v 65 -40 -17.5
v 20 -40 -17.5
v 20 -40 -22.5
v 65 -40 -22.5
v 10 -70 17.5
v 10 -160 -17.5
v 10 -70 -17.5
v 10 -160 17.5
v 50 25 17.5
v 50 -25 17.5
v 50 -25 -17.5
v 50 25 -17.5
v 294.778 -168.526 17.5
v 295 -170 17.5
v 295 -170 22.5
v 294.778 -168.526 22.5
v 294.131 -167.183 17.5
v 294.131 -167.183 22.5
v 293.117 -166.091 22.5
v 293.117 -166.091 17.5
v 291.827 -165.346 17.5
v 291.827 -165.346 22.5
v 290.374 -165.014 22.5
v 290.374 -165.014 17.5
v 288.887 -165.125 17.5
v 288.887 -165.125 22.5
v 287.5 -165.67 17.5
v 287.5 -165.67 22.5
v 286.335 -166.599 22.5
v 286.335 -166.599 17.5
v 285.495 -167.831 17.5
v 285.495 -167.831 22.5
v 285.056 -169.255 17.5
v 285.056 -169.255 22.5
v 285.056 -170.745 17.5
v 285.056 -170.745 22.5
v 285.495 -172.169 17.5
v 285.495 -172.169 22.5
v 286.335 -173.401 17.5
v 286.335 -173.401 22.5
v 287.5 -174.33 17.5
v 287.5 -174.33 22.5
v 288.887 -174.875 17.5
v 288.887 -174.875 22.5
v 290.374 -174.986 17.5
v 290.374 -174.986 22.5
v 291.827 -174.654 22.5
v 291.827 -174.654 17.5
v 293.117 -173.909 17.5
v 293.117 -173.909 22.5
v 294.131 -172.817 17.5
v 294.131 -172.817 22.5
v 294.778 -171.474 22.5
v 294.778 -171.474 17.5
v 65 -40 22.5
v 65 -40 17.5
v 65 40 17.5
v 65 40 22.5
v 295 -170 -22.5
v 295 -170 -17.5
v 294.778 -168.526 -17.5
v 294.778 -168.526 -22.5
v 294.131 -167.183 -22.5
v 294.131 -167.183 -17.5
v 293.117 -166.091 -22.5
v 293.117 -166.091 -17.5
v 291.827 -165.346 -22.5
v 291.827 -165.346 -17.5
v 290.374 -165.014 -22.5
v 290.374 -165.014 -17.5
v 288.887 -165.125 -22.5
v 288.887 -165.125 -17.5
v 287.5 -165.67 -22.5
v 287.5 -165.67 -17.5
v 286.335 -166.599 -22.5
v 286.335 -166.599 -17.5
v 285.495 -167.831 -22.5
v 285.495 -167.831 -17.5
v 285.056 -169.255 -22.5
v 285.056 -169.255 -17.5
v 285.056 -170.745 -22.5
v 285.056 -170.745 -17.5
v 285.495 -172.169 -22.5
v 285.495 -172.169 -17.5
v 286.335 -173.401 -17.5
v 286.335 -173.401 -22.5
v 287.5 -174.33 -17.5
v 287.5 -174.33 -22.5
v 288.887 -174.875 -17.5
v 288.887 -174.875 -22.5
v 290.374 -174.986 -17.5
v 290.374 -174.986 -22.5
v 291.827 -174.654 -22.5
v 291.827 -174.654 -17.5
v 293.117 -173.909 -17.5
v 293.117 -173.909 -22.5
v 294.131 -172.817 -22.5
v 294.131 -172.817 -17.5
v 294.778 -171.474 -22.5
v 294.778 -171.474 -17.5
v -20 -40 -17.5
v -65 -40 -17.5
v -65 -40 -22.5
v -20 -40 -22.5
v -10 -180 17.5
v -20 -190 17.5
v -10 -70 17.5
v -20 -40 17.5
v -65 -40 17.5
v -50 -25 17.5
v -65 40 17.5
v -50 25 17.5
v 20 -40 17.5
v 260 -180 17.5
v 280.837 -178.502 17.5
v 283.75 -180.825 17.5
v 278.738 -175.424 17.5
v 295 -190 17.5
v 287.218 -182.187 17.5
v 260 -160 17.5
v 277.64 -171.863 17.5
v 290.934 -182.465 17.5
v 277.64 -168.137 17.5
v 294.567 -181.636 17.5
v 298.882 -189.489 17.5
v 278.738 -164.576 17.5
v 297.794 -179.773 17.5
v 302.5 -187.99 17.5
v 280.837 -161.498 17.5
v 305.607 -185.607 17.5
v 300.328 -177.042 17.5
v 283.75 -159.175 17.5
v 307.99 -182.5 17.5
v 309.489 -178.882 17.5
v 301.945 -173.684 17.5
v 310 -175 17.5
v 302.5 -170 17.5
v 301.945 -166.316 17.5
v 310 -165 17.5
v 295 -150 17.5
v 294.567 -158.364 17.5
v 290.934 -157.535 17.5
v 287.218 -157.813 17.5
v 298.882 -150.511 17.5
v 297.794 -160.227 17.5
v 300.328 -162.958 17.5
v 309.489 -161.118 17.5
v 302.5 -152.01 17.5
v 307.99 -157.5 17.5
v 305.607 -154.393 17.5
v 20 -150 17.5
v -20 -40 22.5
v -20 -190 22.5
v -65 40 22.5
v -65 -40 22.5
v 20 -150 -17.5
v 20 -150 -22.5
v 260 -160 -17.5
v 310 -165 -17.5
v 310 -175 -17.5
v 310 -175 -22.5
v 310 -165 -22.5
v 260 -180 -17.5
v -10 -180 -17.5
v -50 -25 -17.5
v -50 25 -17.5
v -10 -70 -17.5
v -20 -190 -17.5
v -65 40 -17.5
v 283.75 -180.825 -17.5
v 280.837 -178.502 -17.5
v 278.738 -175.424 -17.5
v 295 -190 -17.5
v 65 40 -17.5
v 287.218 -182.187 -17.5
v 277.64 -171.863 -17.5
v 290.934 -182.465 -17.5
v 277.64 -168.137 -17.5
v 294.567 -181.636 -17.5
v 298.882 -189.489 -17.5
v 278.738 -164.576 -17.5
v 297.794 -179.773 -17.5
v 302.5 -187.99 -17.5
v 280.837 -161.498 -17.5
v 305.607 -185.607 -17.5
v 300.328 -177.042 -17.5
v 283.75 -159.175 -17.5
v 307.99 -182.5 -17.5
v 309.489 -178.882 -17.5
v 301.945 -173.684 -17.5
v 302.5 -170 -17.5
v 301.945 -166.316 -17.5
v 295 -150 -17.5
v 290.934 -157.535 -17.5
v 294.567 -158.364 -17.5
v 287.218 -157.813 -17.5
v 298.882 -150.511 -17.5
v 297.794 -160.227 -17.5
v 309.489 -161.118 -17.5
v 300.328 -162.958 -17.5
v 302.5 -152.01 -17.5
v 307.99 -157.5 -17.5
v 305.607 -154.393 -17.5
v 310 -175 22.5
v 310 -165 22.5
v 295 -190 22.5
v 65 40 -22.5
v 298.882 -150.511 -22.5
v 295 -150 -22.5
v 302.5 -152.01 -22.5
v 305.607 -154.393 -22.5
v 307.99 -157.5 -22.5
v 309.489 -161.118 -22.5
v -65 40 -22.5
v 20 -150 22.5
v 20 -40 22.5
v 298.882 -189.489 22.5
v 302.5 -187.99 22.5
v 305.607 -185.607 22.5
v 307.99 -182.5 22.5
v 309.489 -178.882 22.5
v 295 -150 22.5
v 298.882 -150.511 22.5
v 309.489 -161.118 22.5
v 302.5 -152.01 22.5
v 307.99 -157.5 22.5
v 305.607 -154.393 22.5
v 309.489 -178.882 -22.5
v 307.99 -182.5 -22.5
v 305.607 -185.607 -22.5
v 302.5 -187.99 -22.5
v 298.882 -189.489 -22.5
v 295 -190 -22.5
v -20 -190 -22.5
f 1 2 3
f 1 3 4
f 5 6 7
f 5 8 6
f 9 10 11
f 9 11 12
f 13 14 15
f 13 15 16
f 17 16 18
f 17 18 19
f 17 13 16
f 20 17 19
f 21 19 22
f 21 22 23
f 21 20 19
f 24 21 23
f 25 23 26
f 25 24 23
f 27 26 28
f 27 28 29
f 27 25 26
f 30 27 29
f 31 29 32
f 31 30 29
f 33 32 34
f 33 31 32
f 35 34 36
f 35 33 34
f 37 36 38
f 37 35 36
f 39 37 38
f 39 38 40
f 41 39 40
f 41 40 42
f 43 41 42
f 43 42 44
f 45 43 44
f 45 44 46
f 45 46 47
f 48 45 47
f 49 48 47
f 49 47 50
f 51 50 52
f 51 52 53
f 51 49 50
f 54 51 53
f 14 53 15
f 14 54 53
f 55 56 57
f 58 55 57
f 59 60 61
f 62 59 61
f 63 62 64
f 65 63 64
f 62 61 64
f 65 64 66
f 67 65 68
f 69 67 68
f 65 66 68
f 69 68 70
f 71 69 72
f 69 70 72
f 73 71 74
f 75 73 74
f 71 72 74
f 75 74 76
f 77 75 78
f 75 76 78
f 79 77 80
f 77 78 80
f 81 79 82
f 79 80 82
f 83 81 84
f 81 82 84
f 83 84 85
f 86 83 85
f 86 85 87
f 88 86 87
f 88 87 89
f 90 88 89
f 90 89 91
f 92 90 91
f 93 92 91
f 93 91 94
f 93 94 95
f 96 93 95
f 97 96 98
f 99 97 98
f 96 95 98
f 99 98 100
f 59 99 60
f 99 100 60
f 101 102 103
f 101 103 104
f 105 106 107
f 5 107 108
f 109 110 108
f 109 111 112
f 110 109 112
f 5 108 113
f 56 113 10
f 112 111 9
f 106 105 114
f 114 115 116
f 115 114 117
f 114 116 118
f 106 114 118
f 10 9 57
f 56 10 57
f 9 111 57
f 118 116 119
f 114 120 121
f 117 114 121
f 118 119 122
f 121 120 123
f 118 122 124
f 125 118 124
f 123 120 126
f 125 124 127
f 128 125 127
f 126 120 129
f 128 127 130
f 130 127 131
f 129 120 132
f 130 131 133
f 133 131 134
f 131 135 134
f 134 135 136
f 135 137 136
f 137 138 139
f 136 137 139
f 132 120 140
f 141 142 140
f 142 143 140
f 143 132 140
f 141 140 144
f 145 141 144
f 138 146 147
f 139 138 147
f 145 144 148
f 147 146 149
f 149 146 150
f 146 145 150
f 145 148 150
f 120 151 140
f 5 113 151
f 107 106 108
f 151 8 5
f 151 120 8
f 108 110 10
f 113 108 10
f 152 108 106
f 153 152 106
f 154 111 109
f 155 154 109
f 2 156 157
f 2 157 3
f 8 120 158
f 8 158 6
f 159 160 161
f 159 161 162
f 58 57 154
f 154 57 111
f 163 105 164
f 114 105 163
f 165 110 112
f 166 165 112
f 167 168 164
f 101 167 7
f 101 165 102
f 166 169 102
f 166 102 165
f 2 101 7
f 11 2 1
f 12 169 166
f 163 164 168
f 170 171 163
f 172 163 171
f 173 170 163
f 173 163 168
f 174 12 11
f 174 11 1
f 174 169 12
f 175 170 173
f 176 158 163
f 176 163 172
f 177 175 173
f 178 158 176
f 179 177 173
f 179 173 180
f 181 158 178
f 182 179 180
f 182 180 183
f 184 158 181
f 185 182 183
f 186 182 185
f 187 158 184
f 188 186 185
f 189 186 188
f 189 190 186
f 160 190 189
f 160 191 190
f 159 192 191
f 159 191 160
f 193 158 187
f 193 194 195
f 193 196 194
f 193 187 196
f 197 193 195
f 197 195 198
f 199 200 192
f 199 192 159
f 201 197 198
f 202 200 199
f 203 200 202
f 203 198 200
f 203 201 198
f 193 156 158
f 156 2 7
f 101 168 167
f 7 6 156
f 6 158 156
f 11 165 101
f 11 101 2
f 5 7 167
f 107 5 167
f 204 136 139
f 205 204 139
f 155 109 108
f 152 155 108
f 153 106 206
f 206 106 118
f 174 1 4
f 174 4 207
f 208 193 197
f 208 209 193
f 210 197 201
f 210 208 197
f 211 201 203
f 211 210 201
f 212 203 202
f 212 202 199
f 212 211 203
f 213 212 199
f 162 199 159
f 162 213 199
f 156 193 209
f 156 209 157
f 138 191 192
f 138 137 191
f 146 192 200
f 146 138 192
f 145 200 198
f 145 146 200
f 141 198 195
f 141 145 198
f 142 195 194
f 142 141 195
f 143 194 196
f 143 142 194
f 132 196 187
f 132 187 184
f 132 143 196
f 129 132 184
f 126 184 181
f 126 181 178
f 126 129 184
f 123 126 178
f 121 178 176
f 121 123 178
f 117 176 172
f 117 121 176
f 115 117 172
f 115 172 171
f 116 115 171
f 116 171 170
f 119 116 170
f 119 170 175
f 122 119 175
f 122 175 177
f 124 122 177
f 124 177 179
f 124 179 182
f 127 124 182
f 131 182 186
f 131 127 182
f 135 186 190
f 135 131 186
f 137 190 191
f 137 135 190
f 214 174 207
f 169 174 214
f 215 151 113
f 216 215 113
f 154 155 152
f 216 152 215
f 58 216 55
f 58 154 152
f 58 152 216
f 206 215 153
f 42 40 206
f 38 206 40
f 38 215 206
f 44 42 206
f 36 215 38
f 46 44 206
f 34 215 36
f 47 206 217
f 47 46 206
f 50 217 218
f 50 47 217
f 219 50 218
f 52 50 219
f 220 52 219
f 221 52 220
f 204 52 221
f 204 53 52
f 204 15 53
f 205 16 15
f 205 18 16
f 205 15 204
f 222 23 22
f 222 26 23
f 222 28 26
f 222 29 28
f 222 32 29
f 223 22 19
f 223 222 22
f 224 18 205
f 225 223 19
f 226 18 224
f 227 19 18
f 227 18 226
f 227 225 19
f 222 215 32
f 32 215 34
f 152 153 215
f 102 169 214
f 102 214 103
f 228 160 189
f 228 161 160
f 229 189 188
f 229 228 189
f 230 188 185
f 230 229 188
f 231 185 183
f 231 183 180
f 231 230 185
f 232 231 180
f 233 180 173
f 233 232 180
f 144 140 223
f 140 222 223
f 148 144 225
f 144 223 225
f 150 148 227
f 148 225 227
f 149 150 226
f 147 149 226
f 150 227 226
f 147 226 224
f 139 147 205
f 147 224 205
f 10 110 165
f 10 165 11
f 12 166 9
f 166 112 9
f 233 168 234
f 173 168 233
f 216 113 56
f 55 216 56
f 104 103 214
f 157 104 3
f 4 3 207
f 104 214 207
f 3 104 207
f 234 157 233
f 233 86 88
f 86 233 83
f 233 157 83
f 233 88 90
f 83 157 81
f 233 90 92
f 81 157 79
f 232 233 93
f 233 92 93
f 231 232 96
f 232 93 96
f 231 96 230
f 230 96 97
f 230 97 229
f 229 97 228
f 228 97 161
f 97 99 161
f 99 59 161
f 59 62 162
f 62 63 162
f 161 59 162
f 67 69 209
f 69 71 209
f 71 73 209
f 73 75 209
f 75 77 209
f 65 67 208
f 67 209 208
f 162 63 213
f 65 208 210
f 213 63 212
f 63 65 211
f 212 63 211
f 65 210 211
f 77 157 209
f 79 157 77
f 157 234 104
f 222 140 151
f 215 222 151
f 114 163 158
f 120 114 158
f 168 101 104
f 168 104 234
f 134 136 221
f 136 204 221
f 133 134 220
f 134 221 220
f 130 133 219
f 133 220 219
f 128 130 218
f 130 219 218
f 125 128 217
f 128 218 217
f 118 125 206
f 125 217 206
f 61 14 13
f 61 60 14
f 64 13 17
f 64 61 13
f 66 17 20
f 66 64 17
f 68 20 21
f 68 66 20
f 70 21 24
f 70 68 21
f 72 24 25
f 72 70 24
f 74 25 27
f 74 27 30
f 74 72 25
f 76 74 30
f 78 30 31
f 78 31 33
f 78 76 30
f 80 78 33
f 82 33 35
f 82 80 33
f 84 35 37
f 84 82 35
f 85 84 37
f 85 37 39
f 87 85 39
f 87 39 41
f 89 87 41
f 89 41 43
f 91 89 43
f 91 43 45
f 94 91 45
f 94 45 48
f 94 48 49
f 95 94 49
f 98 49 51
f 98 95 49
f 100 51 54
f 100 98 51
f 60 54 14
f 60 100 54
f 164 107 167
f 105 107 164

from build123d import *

# Parameters (mm, degrees)
SKETCH1_W           = 100
SKETCH1_H           = 50
BOSS_EXTRUDE1_DEPTH = 17.5
SKETCH2_R           = 5
BOSS_EXTRUDE2_DEPTH = 5
BOSS_EXTRUDE3_DEPTH = 17.5
FILLET1_R           = 15
SKETCH5_R           = 12.5
SKETCH5_R_2         = 5
BOSS_EXTRUDE4_DEPTH = 17.5


with BuildPart() as part:
    # Sketch1 → Boss-Extrude1 (new, symmetric)
    with BuildSketch(Plane.XY):
        Rectangle(SKETCH1_W, SKETCH1_H)
    extrude(amount=BOSS_EXTRUDE1_DEPTH, both=True)

    # Sketch2 → Boss-Extrude2 (add)
    with BuildSketch(Plane.XY.offset(17.5)):
        Polygon((20, -40), (65, -40), (65, 40), (-65, 40), (-65, -40), (-20, -40), (-20, -190), (20, -190), (270, -190), (310, -190), (310, -150), (270, -150), (20, -150), align=None)
        with Locations((290, -170)):
            Circle(SKETCH2_R, mode=Mode.SUBTRACT)
    boss_extrude2 = extrude(amount=BOSS_EXTRUDE2_DEPTH)

    # Mirror1: Boss-Extrude2 across plane
    add(boss_extrude2.mirror(Plane.XY))

    # Sketch4 → Boss-Extrude3 (add, symmetric)
    with BuildSketch(Plane.XY):
        Polygon((-10, -70), (-10, -180), (260, -180), (260, -160), (10, -160), (10, -70), align=None)
    extrude(amount=BOSS_EXTRUDE3_DEPTH, both=True)

    # Fillet1
    fillet1_edges = [part.edges().sort_by_distance(p)[0] for p in [
        (310, -190, 20),
        (310, -150, 20),
        (310, -150, -20),
        (310, -190, -20),
    ]]
    fillet(fillet1_edges, radius=FILLET1_R)

    # Sketch5 → Boss-Extrude4 (add, symmetric)
    with BuildSketch(Plane.XY):
        with Locations((290, -170)):
            Circle(SKETCH5_R)
        with Locations((290, -170)):
            Circle(SKETCH5_R_2, mode=Mode.SUBTRACT)
    extrude(amount=BOSS_EXTRUDE4_DEPTH, both=True)


solid = part.part
